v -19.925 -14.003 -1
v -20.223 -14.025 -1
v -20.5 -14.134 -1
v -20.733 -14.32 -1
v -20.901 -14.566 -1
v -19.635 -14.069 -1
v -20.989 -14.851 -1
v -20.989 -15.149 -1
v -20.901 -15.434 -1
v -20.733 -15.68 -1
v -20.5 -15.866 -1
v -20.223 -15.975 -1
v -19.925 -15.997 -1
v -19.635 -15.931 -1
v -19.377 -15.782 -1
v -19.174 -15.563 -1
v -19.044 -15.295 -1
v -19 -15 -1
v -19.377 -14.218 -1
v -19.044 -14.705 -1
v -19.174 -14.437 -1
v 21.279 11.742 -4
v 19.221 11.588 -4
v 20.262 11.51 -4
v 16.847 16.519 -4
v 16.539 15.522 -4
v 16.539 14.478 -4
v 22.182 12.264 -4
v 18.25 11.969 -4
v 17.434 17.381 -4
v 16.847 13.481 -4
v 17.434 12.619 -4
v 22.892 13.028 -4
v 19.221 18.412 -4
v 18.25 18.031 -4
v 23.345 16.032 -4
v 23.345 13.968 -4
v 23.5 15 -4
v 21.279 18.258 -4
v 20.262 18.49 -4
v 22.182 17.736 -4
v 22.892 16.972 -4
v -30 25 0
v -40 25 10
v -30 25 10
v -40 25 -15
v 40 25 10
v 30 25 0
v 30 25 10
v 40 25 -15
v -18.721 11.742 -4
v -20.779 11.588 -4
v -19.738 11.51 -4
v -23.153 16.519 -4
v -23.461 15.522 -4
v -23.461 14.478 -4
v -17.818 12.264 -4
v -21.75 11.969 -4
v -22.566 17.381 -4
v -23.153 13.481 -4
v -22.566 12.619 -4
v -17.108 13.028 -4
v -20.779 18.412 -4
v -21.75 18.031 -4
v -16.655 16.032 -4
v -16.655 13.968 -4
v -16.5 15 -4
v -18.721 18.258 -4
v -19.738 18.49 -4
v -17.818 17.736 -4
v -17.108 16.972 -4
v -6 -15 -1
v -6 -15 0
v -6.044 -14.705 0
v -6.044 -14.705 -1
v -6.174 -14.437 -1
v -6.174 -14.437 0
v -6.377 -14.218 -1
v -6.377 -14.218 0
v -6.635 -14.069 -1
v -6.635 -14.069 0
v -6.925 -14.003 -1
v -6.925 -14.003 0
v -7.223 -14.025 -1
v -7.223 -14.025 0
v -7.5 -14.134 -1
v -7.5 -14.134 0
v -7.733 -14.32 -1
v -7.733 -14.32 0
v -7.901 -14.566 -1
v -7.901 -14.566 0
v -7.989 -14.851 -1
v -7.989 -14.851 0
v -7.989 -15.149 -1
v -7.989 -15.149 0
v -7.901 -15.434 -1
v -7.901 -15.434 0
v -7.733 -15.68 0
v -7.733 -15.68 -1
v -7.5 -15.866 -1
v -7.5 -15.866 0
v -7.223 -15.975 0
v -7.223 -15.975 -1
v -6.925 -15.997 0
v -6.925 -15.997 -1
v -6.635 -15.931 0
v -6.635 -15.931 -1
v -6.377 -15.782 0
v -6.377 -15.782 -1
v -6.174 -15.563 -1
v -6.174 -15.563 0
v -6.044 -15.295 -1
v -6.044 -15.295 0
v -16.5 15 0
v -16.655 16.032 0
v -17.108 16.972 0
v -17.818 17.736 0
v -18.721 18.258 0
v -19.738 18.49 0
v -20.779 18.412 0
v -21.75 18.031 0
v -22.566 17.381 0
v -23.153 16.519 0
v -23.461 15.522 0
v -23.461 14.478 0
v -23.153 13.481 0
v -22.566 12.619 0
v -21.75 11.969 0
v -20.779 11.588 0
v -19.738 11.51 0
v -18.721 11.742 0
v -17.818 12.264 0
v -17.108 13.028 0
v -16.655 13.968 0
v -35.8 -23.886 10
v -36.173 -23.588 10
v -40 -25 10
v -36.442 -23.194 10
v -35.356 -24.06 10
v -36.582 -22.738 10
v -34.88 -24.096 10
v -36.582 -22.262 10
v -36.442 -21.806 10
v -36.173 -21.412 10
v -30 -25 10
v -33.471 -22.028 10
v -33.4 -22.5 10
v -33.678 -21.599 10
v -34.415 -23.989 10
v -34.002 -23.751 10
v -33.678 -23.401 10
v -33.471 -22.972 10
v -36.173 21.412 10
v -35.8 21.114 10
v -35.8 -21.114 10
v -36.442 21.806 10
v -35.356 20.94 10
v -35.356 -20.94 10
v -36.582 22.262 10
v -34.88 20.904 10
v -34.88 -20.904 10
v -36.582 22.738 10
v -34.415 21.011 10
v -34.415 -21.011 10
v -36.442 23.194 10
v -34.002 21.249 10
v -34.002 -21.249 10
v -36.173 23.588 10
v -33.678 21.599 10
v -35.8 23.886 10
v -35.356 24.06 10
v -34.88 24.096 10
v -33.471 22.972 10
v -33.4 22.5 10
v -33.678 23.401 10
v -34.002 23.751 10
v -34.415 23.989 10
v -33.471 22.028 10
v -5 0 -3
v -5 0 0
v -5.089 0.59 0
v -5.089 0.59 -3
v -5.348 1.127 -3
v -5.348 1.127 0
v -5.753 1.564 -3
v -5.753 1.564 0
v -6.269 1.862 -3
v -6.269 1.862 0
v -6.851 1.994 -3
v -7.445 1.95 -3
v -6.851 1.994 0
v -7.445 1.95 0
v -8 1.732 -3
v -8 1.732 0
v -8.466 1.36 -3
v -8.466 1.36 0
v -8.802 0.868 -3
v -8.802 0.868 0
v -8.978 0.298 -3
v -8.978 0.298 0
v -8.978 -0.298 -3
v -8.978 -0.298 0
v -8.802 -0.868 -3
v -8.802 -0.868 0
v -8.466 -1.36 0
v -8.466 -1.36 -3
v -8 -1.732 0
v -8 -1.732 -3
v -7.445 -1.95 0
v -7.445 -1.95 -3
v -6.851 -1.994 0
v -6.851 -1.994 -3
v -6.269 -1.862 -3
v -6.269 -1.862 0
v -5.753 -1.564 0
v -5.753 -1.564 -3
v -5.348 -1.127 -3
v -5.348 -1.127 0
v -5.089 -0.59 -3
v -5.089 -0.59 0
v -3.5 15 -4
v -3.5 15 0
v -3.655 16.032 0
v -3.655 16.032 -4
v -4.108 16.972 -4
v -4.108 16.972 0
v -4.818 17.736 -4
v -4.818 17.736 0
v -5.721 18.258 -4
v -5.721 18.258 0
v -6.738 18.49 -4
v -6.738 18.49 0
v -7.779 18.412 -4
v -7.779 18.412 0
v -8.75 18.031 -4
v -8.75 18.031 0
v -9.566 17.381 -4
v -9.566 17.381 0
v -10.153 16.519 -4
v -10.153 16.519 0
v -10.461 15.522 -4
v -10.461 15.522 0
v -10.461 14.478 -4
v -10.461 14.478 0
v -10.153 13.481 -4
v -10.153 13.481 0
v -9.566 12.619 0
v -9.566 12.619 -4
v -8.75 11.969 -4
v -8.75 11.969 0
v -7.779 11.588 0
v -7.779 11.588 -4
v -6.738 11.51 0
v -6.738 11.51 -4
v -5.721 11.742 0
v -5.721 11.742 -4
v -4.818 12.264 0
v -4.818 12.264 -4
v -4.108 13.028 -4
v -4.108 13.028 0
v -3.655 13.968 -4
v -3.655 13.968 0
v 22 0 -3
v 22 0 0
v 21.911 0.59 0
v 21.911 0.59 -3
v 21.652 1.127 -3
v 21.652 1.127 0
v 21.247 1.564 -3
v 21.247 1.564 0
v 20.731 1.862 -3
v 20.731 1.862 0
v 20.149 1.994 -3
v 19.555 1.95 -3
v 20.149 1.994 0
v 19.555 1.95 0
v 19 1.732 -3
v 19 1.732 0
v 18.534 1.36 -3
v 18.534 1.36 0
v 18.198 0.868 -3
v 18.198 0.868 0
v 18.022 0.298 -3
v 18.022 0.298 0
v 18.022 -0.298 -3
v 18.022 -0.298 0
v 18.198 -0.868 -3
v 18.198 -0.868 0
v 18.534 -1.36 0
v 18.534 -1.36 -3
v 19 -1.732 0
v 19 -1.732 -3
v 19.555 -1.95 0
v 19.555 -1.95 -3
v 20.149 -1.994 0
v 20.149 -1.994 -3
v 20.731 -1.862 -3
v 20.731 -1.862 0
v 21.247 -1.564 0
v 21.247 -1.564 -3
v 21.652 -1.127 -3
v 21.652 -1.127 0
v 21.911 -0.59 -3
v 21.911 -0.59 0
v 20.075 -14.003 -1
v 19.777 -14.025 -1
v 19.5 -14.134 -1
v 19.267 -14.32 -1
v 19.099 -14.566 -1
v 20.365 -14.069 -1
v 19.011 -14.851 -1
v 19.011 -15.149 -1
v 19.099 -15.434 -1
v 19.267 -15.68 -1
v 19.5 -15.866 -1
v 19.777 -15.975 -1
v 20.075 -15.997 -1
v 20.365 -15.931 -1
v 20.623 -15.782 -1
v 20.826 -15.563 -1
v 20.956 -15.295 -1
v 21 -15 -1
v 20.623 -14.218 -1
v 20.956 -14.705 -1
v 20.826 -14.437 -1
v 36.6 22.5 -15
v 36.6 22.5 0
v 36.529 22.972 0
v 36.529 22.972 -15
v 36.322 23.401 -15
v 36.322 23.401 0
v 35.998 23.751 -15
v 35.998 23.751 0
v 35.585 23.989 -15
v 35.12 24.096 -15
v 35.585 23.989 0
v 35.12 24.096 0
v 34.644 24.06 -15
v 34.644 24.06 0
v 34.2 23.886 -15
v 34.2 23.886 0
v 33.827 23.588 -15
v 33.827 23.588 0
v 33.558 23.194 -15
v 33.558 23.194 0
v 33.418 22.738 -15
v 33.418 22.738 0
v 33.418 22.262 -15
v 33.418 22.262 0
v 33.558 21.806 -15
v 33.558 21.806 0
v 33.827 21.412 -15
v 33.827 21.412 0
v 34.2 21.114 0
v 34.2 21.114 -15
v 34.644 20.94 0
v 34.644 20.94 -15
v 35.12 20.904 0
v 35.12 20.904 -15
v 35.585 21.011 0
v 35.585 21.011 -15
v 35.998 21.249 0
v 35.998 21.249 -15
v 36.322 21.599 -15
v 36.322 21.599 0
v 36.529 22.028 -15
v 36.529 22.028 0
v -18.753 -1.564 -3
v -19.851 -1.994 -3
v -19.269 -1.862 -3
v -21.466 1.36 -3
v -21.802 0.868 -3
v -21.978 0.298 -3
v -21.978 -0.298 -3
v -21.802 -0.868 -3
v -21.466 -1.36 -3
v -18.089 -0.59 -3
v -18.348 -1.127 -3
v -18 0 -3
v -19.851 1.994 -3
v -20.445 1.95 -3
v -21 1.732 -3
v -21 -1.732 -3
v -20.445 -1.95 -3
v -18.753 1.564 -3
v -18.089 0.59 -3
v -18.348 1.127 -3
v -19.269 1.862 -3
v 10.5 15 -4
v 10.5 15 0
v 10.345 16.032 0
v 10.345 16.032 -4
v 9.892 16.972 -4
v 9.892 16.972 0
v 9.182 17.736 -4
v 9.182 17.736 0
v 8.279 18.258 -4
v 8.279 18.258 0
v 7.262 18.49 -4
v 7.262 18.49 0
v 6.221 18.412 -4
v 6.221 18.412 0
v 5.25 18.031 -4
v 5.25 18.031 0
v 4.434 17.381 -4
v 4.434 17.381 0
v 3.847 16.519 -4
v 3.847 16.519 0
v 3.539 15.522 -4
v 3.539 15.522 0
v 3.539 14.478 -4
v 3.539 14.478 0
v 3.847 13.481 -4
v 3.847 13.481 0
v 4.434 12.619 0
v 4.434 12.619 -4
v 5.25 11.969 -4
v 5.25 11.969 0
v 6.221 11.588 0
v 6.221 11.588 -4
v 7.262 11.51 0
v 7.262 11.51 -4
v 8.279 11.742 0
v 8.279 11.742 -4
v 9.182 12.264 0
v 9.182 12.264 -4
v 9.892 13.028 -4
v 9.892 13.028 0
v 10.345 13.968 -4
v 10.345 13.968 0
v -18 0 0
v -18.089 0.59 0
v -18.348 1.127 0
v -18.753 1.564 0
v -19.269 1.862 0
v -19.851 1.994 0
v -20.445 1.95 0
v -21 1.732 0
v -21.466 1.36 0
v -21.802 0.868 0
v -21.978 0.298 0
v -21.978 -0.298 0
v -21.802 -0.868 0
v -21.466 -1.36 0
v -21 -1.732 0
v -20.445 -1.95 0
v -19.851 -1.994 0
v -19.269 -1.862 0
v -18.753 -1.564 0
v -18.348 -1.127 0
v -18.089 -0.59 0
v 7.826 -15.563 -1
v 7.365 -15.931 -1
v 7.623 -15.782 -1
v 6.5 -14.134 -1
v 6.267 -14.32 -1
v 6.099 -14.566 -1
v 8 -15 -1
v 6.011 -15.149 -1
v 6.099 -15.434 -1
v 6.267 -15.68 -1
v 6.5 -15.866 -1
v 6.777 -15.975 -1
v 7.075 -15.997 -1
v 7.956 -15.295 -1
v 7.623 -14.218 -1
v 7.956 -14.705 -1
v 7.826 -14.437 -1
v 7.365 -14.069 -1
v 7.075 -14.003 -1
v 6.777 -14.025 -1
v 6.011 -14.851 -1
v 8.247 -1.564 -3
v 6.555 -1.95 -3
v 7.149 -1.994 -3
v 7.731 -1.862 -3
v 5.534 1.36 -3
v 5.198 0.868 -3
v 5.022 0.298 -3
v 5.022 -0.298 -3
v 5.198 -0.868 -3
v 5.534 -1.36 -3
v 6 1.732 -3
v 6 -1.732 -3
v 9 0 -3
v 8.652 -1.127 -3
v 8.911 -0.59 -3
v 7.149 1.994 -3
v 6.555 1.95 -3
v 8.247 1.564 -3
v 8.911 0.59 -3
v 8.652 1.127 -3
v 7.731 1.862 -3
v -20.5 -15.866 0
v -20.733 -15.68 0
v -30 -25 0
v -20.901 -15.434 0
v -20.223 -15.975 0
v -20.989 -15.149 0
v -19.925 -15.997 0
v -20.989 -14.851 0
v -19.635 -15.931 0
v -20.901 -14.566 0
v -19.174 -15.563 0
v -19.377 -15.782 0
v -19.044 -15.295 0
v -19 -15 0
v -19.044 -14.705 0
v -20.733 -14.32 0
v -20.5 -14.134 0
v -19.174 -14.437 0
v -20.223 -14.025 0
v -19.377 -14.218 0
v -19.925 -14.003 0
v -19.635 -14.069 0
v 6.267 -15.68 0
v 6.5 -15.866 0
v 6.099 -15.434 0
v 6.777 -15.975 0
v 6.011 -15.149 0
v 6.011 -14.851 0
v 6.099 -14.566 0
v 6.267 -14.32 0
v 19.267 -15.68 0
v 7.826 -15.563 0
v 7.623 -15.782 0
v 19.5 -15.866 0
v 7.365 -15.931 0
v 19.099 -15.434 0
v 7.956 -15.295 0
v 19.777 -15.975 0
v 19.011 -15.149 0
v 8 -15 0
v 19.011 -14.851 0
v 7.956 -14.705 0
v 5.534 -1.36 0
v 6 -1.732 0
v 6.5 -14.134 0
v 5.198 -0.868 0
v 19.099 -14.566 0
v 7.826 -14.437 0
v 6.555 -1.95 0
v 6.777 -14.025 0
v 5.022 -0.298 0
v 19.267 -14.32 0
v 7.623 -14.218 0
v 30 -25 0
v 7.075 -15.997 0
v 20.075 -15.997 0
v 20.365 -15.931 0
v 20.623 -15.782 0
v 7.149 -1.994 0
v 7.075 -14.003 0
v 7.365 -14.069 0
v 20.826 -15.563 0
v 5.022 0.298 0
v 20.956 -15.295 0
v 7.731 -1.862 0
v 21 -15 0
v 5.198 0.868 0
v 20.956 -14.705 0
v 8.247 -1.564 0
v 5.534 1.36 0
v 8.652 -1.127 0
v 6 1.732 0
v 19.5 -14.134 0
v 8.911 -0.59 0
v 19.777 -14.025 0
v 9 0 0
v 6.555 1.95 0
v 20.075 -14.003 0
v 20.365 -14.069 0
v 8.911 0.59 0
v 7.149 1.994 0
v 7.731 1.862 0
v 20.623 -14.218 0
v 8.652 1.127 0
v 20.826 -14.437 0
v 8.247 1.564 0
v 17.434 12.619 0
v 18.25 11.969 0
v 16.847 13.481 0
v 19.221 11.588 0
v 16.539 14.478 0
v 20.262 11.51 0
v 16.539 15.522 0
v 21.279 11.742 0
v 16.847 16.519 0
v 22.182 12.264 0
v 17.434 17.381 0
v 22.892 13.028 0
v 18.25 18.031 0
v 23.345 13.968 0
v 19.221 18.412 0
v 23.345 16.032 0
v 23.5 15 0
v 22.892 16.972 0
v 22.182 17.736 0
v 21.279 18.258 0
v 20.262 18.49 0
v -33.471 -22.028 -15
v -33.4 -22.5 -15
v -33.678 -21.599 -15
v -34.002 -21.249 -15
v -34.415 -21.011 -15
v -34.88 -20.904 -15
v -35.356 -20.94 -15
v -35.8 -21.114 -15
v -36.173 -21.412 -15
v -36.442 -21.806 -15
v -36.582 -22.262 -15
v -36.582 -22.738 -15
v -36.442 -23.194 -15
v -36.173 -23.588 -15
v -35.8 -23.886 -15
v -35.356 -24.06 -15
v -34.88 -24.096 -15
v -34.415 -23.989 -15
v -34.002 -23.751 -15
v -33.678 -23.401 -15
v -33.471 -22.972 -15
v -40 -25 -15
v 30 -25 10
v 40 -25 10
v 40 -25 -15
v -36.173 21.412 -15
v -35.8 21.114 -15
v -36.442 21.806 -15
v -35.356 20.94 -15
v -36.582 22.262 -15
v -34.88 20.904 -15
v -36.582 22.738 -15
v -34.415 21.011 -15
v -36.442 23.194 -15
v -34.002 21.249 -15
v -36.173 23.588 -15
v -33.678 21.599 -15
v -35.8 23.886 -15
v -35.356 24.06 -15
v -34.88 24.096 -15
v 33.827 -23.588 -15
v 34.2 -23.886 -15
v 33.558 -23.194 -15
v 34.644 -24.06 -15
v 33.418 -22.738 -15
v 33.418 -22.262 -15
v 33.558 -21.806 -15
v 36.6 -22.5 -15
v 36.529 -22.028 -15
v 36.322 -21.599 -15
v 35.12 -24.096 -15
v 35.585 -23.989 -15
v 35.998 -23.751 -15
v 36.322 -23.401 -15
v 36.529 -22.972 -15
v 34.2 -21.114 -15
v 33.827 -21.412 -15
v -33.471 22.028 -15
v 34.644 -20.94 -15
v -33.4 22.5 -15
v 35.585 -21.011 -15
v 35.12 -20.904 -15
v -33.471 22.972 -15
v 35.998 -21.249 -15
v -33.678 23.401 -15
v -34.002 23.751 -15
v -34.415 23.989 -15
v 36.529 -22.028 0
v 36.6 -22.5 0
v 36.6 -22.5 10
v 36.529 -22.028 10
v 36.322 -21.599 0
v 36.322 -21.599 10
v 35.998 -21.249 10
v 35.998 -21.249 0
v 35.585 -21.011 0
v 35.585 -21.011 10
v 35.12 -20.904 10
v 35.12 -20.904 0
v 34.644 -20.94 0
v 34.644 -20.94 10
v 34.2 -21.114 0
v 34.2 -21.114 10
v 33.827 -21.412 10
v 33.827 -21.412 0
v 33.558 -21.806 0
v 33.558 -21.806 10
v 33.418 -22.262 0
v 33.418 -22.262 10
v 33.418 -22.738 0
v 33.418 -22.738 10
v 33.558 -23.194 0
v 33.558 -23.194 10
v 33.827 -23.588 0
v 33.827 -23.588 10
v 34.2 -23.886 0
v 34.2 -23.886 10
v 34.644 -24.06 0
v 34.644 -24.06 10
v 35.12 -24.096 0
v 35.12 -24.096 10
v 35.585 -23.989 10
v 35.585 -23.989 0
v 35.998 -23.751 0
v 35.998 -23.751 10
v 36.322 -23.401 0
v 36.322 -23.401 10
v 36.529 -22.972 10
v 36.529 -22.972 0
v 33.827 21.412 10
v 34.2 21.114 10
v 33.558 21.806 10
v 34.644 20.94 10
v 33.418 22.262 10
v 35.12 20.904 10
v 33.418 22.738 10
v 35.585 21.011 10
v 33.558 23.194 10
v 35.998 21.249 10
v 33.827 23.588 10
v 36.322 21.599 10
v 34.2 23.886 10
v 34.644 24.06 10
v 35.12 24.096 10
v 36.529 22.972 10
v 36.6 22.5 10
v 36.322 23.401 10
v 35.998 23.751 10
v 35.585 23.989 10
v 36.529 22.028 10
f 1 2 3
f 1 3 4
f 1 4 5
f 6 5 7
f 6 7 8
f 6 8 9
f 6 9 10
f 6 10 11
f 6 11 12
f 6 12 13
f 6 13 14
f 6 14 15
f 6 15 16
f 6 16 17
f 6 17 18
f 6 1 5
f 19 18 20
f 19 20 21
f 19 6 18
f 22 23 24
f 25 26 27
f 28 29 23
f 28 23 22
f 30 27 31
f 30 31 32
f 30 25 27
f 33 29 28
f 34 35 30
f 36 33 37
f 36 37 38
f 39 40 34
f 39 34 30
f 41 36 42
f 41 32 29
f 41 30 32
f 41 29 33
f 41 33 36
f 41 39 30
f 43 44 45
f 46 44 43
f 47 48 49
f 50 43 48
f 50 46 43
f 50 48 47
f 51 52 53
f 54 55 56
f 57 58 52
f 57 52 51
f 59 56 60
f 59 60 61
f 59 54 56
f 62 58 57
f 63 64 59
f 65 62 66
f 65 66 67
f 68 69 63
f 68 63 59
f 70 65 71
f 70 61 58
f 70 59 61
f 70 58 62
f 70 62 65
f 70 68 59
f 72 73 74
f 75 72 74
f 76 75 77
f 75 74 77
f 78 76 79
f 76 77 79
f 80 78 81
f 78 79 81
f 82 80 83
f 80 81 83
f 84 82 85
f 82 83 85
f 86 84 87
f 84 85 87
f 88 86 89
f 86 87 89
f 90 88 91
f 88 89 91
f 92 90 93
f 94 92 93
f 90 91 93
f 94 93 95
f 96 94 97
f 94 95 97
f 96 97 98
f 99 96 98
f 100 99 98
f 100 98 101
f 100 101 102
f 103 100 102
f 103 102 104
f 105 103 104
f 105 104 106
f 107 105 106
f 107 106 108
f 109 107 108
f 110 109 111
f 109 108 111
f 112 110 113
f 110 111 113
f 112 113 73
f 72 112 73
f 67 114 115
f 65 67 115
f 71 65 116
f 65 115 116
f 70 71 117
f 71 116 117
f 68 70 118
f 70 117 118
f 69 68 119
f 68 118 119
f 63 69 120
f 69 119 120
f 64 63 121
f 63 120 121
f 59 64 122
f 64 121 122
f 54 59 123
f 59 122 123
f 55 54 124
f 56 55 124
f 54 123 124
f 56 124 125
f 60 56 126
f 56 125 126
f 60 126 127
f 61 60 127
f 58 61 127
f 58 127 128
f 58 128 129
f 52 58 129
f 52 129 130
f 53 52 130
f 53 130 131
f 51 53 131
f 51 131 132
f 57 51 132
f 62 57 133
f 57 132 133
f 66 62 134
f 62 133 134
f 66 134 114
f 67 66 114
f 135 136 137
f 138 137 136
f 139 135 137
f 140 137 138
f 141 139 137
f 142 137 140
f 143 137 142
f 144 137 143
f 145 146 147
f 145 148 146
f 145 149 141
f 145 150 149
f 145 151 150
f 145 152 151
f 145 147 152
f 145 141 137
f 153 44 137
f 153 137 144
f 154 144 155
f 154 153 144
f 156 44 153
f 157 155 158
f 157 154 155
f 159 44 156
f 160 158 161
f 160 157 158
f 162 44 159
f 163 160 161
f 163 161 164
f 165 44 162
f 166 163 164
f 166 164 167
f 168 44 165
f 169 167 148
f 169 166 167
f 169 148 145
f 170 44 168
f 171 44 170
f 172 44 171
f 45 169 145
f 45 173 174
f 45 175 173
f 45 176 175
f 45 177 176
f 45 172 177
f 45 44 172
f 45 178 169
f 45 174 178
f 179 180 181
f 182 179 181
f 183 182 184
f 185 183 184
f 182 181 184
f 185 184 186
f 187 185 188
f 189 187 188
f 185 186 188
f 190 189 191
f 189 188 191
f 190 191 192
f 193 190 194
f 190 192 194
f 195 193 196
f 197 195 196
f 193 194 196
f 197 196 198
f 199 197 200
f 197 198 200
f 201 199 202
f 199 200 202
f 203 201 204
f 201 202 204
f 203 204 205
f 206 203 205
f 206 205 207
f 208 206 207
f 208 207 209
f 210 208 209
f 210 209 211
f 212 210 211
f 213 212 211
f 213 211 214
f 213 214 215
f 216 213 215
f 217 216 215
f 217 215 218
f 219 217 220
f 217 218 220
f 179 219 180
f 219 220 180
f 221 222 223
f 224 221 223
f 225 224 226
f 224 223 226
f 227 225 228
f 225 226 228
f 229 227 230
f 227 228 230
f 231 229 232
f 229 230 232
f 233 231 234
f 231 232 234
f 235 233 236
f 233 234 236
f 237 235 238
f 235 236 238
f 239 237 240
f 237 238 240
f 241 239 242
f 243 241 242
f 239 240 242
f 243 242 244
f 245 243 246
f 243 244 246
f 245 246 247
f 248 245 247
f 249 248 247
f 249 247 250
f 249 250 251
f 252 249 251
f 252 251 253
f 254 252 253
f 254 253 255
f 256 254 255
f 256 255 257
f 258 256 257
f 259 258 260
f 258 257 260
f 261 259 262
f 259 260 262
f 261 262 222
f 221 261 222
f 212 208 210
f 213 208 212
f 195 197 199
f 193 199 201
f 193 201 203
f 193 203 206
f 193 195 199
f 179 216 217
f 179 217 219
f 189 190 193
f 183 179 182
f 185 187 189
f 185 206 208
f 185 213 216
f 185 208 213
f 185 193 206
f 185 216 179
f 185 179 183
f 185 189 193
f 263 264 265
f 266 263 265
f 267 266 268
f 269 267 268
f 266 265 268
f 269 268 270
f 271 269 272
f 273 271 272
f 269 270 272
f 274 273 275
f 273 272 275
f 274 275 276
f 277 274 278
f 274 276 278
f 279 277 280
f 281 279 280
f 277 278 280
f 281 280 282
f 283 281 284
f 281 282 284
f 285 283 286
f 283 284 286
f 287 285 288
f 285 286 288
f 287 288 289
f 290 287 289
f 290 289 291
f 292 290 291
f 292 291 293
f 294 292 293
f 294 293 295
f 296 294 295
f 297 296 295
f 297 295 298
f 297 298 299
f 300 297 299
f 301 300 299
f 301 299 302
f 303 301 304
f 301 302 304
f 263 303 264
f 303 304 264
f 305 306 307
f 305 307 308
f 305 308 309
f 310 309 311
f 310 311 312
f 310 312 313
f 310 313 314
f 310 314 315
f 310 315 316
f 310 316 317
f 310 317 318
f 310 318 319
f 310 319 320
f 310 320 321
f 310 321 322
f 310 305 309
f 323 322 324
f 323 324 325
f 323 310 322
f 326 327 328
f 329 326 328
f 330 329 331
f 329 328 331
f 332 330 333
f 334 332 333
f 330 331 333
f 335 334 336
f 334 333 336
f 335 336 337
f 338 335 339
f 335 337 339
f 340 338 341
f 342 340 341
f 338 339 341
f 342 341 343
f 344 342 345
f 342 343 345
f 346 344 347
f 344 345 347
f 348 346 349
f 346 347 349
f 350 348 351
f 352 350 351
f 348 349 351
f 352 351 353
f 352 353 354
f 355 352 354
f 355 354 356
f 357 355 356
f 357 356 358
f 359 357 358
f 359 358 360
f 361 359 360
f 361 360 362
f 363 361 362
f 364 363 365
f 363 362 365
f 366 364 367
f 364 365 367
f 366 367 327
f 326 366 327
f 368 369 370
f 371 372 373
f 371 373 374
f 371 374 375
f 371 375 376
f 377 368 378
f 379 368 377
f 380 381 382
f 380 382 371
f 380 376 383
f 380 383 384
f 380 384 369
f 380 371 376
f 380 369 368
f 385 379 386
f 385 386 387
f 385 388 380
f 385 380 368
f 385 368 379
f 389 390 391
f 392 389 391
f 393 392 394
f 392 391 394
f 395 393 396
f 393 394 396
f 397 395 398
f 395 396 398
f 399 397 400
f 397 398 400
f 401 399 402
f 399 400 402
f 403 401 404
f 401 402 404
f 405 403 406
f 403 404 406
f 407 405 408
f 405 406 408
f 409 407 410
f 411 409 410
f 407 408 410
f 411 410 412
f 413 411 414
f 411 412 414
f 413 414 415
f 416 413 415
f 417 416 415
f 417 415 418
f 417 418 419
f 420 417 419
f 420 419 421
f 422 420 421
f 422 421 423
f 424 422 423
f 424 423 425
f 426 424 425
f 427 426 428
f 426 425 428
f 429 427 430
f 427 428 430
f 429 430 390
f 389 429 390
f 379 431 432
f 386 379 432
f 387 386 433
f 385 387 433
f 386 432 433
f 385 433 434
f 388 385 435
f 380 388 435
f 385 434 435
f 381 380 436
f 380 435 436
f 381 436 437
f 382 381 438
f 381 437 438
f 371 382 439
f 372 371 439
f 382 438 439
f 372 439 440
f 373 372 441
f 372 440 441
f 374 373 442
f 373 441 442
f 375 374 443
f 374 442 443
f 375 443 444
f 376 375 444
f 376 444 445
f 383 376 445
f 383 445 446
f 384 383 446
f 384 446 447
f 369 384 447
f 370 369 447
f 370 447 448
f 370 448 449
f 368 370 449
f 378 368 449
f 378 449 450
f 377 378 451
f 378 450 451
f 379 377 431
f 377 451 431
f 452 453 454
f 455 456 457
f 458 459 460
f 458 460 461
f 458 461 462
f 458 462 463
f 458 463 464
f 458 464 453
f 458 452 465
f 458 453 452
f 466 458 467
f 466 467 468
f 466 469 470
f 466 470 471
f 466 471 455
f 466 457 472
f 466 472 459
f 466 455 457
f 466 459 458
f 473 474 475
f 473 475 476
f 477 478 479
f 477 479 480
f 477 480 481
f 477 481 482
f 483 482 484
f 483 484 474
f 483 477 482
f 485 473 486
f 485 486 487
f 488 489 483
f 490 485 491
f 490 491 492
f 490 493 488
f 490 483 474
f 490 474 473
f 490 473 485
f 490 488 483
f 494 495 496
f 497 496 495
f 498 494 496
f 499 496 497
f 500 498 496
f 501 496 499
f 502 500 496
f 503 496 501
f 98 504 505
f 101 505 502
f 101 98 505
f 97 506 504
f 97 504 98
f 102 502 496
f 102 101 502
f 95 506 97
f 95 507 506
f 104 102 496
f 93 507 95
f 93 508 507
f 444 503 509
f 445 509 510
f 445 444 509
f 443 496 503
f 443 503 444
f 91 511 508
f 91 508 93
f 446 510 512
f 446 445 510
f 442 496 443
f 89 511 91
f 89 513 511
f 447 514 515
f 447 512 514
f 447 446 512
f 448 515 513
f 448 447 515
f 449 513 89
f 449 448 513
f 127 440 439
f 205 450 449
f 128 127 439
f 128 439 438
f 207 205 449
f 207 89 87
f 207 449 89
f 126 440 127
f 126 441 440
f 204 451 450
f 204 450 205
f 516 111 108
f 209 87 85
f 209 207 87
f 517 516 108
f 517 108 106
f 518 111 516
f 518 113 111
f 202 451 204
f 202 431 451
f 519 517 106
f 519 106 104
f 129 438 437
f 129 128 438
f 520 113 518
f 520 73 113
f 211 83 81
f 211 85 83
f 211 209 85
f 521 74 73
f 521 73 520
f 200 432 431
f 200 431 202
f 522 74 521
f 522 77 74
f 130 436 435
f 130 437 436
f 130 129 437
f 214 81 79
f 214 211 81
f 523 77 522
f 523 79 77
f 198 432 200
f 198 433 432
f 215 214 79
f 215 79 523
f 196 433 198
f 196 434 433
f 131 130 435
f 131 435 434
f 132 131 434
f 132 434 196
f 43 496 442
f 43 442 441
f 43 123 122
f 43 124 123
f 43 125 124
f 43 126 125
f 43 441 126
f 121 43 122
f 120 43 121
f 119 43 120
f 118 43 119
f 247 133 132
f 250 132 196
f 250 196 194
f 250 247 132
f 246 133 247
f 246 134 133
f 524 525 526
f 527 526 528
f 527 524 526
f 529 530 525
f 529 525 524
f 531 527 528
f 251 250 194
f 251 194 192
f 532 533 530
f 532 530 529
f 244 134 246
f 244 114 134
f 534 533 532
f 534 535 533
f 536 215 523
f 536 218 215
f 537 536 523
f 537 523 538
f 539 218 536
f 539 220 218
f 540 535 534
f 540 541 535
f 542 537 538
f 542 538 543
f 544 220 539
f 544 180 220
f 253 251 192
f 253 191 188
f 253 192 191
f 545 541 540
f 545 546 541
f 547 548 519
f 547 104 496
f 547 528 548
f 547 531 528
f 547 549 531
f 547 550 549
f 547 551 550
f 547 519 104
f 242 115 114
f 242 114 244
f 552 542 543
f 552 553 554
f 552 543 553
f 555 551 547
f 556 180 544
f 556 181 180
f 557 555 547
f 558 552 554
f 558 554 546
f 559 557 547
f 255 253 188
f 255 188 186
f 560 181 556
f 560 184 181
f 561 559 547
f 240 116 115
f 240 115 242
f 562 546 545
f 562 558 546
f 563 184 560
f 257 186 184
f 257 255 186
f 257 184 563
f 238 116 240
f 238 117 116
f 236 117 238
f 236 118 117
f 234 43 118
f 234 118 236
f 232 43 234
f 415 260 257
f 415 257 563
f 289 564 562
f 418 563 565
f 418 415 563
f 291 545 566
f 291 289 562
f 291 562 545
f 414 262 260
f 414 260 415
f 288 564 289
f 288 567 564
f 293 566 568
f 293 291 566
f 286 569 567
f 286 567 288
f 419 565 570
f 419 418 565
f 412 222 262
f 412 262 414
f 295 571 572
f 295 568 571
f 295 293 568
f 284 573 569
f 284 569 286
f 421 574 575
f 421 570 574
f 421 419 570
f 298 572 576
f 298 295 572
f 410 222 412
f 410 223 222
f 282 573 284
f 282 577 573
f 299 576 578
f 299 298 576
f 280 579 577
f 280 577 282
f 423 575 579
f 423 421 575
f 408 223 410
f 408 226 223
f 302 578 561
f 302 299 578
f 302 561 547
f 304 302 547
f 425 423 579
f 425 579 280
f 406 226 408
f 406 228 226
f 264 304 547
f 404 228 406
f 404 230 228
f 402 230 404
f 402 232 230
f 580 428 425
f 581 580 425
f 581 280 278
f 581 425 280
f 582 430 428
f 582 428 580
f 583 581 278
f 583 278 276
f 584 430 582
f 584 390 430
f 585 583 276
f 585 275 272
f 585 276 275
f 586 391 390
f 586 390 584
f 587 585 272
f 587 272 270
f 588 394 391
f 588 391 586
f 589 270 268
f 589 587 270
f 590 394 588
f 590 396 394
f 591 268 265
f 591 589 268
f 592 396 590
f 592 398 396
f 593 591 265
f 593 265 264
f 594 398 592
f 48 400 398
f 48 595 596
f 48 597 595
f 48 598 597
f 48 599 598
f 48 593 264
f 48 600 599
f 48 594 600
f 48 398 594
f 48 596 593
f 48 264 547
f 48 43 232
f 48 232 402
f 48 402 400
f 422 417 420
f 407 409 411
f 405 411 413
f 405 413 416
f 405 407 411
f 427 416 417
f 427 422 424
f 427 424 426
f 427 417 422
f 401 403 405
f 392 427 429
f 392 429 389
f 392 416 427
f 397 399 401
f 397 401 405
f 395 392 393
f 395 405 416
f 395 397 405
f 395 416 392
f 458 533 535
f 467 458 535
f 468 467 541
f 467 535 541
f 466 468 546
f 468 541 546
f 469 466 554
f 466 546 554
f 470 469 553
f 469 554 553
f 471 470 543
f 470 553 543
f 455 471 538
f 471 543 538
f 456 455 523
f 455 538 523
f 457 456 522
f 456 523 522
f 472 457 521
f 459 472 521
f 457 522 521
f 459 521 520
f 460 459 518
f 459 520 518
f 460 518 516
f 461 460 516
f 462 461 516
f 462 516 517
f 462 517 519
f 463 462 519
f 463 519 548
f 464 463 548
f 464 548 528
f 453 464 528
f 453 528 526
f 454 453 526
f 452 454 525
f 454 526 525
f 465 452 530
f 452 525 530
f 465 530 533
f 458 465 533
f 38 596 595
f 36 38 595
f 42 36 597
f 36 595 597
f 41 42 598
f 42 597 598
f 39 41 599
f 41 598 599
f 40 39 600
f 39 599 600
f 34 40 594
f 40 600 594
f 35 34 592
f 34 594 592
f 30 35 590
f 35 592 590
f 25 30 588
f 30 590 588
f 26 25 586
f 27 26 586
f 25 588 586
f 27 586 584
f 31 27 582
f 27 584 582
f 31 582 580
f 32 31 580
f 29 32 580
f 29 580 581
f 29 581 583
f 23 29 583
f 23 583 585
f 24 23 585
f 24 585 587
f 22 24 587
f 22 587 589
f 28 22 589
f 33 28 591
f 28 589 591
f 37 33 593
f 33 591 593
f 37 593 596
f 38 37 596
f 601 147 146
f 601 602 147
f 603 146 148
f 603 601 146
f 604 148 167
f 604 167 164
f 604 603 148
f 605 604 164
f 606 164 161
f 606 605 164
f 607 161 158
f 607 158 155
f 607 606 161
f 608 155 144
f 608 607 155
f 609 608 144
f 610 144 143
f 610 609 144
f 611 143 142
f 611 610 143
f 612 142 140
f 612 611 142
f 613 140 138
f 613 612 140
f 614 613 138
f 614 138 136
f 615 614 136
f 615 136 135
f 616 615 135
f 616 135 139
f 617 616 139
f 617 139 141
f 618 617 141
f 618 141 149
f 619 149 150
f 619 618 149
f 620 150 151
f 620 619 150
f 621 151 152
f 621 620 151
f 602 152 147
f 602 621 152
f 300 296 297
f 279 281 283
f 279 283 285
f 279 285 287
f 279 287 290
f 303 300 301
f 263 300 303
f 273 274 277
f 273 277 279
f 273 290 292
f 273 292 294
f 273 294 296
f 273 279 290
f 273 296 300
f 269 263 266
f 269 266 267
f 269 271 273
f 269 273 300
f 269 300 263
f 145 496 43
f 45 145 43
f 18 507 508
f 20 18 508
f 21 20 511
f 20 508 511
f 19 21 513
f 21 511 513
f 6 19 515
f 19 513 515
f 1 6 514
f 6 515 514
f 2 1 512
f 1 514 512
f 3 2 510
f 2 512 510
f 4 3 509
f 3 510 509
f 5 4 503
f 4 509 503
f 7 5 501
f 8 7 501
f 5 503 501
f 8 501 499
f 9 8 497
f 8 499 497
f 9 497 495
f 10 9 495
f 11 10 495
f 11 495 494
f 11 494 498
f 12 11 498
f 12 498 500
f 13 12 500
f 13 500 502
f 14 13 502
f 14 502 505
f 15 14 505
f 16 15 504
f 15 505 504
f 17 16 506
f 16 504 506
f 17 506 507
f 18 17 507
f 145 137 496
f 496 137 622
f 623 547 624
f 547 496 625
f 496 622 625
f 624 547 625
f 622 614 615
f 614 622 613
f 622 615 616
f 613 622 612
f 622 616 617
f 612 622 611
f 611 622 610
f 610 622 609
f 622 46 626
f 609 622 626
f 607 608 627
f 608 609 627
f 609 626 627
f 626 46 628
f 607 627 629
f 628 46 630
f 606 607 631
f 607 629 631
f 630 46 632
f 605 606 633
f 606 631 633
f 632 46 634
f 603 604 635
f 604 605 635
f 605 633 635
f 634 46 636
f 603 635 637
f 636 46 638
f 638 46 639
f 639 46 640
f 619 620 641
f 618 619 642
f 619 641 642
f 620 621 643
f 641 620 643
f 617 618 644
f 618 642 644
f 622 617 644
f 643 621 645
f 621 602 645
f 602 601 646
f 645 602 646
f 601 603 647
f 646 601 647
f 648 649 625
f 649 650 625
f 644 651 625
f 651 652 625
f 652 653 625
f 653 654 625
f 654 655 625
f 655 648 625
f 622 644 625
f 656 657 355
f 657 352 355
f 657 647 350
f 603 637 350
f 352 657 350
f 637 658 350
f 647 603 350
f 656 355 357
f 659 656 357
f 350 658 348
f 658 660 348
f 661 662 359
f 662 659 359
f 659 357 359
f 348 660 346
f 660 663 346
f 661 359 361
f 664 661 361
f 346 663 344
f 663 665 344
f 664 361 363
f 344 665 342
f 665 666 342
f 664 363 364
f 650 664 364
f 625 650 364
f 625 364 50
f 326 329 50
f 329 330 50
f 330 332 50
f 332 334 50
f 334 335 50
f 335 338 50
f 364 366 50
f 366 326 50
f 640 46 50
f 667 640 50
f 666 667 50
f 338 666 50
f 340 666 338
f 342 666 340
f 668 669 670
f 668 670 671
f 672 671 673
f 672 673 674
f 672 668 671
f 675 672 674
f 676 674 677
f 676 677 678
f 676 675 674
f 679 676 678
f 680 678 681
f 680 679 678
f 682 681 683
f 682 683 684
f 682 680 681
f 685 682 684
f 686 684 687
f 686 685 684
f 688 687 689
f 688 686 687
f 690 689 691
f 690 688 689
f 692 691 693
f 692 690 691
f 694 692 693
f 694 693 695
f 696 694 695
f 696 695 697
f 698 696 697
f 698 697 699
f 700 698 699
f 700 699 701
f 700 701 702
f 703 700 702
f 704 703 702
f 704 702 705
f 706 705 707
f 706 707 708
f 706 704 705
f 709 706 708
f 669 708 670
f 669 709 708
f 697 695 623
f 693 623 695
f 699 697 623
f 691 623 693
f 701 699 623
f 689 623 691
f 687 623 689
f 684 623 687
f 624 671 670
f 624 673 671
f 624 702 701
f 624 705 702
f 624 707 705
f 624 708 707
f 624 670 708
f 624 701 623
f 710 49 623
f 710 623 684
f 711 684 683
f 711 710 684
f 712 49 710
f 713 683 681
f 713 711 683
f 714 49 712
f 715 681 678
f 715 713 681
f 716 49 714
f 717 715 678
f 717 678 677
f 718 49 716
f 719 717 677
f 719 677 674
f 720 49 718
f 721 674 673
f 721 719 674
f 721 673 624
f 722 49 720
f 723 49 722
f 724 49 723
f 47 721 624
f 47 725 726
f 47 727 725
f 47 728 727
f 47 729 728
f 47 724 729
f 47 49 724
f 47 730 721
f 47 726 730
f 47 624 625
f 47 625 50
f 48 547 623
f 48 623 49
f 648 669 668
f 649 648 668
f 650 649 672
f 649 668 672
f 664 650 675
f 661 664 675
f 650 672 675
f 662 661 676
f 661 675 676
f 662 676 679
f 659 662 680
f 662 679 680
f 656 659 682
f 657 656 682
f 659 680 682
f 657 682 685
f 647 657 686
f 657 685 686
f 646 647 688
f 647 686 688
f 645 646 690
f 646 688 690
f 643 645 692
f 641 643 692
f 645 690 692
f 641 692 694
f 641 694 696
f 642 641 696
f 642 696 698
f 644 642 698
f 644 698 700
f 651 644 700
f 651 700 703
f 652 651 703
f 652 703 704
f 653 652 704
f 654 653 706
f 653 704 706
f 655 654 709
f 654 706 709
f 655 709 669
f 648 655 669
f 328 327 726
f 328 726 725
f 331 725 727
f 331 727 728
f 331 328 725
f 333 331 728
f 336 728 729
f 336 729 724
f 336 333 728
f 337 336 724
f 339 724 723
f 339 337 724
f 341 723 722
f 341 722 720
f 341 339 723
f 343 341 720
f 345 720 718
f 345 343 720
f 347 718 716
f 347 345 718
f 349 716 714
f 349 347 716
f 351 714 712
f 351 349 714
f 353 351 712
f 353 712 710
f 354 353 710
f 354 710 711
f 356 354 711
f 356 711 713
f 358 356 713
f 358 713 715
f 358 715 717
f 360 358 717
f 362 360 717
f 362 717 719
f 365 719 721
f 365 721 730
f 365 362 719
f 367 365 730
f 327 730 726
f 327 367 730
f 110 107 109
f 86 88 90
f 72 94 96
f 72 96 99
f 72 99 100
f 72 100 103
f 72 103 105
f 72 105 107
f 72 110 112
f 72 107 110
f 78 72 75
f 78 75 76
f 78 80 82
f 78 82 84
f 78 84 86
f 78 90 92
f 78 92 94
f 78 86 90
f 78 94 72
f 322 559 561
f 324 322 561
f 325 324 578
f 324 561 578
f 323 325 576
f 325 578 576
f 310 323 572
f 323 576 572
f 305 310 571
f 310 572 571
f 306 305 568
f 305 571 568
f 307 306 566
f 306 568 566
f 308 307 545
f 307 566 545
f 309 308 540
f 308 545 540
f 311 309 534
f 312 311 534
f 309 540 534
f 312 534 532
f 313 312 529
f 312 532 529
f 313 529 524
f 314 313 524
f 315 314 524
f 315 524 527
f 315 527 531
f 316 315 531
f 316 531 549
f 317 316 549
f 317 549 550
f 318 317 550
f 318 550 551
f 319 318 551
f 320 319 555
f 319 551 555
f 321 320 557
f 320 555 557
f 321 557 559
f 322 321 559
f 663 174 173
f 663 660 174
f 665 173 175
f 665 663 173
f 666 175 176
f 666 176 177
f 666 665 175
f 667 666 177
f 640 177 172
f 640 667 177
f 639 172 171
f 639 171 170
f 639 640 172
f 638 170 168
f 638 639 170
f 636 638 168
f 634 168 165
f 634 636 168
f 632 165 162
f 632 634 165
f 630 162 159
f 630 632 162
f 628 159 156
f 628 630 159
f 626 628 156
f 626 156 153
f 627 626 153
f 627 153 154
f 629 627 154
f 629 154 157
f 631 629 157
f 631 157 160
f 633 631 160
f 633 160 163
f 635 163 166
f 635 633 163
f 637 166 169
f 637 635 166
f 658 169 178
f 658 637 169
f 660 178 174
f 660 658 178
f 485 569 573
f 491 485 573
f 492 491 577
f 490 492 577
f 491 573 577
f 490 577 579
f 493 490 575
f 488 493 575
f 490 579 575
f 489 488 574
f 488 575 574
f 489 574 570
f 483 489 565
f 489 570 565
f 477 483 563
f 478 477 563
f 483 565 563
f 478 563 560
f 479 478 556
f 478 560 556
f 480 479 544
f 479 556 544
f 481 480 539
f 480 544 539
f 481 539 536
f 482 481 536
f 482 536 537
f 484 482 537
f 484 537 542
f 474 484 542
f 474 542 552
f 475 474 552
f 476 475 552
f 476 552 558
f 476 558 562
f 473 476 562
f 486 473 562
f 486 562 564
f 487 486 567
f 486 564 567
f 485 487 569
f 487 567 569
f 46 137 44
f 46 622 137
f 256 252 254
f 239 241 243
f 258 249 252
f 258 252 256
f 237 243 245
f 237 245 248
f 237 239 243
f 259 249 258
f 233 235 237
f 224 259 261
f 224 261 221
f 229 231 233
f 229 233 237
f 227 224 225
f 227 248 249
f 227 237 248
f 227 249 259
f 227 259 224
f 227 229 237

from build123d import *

# Parameters (mm, degrees)
F0_W     = 60
F0_H     = 50
F0_R     = 1
F0_R_2   = 2
F0_R_3   = 3.5
F0_W_2   = 10
F0_R_4   = 1.6
F1_DEPTH = 15
F2_DEPTH = 10
F3_DEPTH = 4
F4_DEPTH = 3
F5_DEPTH = 1


with BuildPart() as f1:
    # F0 (on Top) → F1 (new body)
    with BuildSketch(Plane.XY):
        Rectangle(F0_W, F0_H)
        with Locations((-20, -15)):
            Circle(F0_R, mode=Mode.SUBTRACT)
        with Locations((-7, -15)):
            Circle(F0_R, mode=Mode.SUBTRACT)
        with Locations((7, -15)):
            Circle(F0_R, mode=Mode.SUBTRACT)
        with Locations((20, -15)):
            Circle(F0_R, mode=Mode.SUBTRACT)
        with Locations((-20, 0)):
            Circle(F0_R_2, mode=Mode.SUBTRACT)
        with Locations((-7, 0)):
            Circle(F0_R_2, mode=Mode.SUBTRACT)
        with Locations((-20, 15)):
            Circle(F0_R_3, mode=Mode.SUBTRACT)
        with Locations((-7, 15)):
            Circle(F0_R_3, mode=Mode.SUBTRACT)
        with Locations((7, 0)):
            Circle(F0_R_2, mode=Mode.SUBTRACT)
        with Locations((20, 0)):
            Circle(F0_R_2, mode=Mode.SUBTRACT)
        with Locations((7, 15)):
            Circle(F0_R_3, mode=Mode.SUBTRACT)
        with Locations((20, 15)):
            Circle(F0_R_3, mode=Mode.SUBTRACT)
        with Locations((-35, 0)):
            Rectangle(F0_W_2, F0_H)
        with Locations((-35, -22.5)):
            Circle(F0_R_4, mode=Mode.SUBTRACT)
        with Locations((-35, 22.5)):
            Circle(F0_R_4, mode=Mode.SUBTRACT)
        with Locations((35, 0)):
            Rectangle(F0_W_2, F0_H)
        with Locations((35, -22.5)):
            Circle(F0_R_4, mode=Mode.SUBTRACT)
        with Locations((35, 22.5)):
            Circle(F0_R_4, mode=Mode.SUBTRACT)
        with Locations((-20, 15)):
            Circle(F0_R_3)
        with Locations((-7, 15)):
            Circle(F0_R_3)
        with Locations((7, 15)):
            Circle(F0_R_3)
        with Locations((20, 15)):
            Circle(F0_R_3)
        with Locations((7, 0)):
            Circle(F0_R_2)
        with Locations((20, 0)):
            Circle(F0_R_2)
        with Locations((-7, 0)):
            Circle(F0_R_2)
        with Locations((-20, 0)):
            Circle(F0_R_2)
        with Locations((-20, -15)):
            Circle(F0_R)
        with Locations((-7, -15)):
            Circle(F0_R)
        with Locations((7, -15)):
            Circle(F0_R)
        with Locations((20, -15)):
            Circle(F0_R)
    extrude(amount=-F1_DEPTH)

    # F0 (on Top) → F2 (join)
    with BuildSketch(Plane.XY):
        with Locations((-35, 0)):
            Rectangle(F0_W_2, F0_H)
        with Locations((-35, -22.5)):
            Circle(F0_R_4, mode=Mode.SUBTRACT)
        with Locations((-35, 22.5)):
            Circle(F0_R_4, mode=Mode.SUBTRACT)
        with Locations((35, 0)):
            Rectangle(F0_W_2, F0_H)
        with Locations((35, -22.5)):
            Circle(F0_R_4, mode=Mode.SUBTRACT)
        with Locations((35, 22.5)):
            Circle(F0_R_4, mode=Mode.SUBTRACT)
    extrude(amount=F2_DEPTH)

    # F0 (on Top) → F3 (cut)
    with BuildSketch(Plane.XY):
        with Locations((-20, 15)):
            Circle(F0_R_3)
        with Locations((-7, 15)):
            Circle(F0_R_3)
        with Locations((7, 15)):
            Circle(F0_R_3)
        with Locations((20, 15)):
            Circle(F0_R_3)
    extrude(amount=-F3_DEPTH, mode=Mode.SUBTRACT)

    # F0 (on Top) → F4 (cut)
    with BuildSketch(Plane.XY):
        with Locations((-20, 0)):
            Circle(F0_R_2)
        with Locations((-7, 0)):
            Circle(F0_R_2)
        with Locations((7, 0)):
            Circle(F0_R_2)
        with Locations((20, 0)):
            Circle(F0_R_2)
    extrude(amount=-F4_DEPTH, mode=Mode.SUBTRACT)

    # F0 (on Top) → F5 (cut)
    with BuildSketch(Plane.XY):
        with Locations((-20, -15)):
            Circle(F0_R)
        with Locations((-7, -15)):
            Circle(F0_R)
        with Locations((7, -15)):
            Circle(F0_R)
        with Locations((20, -15)):
            Circle(F0_R)
    extrude(amount=-F5_DEPTH, mode=Mode.SUBTRACT)


solid = f1.part
